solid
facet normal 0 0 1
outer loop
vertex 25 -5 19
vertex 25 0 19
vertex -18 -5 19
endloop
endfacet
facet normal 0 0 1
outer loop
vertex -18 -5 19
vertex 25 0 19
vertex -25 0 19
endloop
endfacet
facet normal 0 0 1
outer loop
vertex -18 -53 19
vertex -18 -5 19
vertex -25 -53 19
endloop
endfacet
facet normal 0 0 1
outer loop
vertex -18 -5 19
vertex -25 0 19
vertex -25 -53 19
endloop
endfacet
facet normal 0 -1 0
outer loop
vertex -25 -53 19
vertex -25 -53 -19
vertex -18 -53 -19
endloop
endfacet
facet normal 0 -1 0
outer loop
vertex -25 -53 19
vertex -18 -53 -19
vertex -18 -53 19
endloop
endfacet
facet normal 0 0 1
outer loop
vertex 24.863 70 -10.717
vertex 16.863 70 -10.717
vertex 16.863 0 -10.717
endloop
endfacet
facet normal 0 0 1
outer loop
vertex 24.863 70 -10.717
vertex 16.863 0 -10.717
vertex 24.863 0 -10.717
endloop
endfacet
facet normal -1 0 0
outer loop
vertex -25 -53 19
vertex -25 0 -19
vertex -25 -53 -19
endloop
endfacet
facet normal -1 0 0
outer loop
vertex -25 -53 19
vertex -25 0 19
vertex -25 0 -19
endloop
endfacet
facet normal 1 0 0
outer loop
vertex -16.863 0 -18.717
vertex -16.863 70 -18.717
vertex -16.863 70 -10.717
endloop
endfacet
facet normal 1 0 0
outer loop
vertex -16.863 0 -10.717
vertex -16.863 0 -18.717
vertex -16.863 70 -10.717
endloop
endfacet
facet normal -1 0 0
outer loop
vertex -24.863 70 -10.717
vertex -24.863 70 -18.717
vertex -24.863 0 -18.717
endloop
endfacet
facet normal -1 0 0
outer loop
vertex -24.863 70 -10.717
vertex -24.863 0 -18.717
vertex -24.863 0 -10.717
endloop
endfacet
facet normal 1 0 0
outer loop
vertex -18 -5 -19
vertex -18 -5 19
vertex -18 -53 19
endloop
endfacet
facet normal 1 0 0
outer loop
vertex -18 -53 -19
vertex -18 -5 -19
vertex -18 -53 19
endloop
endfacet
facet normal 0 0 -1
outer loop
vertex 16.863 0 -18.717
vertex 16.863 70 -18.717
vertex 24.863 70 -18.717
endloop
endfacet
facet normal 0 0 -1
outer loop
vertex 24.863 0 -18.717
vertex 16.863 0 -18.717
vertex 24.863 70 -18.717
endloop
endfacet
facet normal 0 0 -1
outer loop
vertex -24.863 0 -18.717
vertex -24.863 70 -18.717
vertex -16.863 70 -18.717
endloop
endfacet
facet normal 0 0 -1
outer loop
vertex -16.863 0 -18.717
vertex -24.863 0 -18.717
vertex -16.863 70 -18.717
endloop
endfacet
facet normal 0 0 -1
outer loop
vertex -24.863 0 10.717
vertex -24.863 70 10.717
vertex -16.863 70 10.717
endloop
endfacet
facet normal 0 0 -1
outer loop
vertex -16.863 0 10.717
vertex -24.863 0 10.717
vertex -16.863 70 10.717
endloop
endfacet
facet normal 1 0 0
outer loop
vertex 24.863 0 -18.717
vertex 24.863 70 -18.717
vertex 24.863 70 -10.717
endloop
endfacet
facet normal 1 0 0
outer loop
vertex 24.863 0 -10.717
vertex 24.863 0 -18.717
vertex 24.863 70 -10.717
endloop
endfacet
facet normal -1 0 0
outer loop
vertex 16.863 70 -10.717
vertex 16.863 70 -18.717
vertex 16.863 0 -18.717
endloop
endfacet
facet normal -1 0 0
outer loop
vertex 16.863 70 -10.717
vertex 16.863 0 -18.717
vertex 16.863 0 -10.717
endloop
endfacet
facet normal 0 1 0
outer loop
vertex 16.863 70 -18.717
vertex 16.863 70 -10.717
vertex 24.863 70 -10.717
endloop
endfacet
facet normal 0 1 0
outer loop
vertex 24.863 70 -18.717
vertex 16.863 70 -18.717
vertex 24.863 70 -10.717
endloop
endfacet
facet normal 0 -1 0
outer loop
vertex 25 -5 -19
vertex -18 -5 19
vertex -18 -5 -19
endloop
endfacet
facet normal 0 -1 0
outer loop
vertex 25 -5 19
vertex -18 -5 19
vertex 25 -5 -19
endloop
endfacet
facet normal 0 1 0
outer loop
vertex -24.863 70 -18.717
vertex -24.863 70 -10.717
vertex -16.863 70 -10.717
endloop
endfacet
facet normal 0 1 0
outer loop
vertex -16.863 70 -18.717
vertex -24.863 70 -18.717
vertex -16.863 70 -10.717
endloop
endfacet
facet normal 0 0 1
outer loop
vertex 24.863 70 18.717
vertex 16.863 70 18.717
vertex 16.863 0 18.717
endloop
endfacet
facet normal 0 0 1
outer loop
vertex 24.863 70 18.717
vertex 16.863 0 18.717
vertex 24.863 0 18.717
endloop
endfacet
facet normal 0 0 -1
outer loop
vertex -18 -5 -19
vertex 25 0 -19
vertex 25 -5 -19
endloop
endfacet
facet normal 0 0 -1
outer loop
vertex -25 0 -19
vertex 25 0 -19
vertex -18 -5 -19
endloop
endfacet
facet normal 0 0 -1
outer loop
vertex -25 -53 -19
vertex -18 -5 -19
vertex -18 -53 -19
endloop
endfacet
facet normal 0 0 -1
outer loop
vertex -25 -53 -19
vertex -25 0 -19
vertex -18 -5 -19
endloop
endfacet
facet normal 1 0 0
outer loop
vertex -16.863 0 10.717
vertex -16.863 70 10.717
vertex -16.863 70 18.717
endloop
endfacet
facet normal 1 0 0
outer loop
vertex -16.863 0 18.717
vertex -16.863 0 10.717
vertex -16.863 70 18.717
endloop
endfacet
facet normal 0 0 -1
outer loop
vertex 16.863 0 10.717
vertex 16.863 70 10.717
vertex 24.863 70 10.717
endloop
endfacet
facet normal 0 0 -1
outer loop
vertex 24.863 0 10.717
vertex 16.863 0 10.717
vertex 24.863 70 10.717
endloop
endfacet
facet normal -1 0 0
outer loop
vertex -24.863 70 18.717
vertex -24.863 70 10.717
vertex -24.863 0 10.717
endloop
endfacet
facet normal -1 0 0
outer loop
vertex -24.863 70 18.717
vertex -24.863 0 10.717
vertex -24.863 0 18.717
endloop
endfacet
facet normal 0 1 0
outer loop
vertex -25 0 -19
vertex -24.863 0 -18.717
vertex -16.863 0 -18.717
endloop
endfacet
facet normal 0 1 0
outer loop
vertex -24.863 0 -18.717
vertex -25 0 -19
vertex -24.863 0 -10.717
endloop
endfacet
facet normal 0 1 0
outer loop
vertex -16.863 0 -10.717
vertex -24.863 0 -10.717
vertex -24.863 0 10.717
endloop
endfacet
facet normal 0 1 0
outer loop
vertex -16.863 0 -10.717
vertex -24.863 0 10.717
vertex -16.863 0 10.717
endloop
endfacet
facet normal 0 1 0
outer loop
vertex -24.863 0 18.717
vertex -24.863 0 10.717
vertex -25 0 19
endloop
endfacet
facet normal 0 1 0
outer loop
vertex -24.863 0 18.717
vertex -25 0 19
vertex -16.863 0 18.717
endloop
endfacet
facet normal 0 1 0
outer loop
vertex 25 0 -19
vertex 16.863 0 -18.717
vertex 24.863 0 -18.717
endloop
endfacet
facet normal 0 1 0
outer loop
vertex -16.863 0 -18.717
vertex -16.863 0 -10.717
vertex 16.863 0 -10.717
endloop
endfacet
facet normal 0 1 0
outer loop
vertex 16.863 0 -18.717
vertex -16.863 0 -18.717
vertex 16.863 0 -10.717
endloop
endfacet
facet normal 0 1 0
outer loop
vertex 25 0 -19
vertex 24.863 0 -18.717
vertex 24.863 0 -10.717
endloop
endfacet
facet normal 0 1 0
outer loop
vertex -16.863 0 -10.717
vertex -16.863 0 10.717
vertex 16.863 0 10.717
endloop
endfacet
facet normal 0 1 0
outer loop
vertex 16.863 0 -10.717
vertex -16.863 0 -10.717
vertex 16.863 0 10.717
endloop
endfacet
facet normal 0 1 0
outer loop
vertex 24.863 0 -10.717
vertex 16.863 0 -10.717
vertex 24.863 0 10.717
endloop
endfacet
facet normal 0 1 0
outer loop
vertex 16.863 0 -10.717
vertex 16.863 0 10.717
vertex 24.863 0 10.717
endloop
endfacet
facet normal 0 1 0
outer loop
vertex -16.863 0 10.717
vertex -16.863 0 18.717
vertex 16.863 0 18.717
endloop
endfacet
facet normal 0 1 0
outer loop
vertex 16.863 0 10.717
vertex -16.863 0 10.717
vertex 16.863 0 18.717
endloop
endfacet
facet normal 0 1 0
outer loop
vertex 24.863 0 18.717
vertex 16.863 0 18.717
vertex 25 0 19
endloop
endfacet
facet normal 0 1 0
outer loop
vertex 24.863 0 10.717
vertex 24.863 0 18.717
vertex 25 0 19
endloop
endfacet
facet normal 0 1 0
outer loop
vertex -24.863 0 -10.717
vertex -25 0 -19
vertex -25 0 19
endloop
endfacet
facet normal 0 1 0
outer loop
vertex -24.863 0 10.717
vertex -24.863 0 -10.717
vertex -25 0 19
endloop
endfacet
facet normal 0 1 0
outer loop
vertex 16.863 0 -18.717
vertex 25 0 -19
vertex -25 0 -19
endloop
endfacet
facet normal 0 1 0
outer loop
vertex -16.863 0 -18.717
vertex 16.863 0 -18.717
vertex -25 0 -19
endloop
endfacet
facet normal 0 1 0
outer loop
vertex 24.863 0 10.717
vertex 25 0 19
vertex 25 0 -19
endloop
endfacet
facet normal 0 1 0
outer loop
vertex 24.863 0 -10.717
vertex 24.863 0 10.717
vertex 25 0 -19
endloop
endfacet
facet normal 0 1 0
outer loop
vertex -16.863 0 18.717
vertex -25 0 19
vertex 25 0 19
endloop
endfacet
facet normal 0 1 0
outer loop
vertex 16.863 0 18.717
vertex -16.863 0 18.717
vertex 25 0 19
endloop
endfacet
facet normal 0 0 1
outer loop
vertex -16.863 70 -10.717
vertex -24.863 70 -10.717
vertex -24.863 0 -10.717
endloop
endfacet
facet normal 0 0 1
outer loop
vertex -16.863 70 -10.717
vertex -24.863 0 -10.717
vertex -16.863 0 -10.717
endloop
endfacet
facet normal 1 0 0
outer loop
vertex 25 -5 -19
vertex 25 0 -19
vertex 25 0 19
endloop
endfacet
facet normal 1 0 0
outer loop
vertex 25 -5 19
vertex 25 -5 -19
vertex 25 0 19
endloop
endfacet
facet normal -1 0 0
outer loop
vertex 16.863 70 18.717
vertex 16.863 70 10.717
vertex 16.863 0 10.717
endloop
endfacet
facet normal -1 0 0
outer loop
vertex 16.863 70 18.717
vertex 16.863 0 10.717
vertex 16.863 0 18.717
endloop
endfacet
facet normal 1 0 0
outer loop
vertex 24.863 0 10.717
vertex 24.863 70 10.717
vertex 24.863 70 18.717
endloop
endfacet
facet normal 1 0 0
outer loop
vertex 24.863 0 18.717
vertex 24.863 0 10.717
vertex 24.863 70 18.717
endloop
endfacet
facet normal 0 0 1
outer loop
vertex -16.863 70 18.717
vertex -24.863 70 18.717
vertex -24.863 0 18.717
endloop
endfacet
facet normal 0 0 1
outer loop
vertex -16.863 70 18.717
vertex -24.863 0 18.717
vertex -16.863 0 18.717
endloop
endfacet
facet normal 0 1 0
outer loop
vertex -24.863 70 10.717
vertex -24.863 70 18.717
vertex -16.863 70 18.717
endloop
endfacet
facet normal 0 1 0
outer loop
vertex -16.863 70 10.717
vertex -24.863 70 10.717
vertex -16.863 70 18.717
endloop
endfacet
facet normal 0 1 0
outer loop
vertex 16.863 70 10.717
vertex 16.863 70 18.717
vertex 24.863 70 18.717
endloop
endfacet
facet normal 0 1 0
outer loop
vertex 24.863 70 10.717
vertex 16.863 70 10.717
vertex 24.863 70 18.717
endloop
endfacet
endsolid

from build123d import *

# Parameters (mm, degrees)
F0_W     = 50
F0_H     = 38
F1_DEPTH = 5
F2_W     = 8
F2_H     = 8
F3_DEPTH = 70
F4_W     = 48
F4_H     = 38
F5_DEPTH = 7


with BuildPart() as f1:
    # F0 (on Front) → F1 (new body)
    with BuildSketch(Plane.XZ):
        Rectangle(F0_W, F0_H)
    extrude(amount=F1_DEPTH)

    # F2 (on Front) → F3 (join)
    with BuildSketch(Plane.XZ):
        with Locations((20.863473, 14.717139)):
            Rectangle(F2_W, F2_H)
        with Locations((20.863473, -14.717139)):
            Rectangle(F2_W, F2_H)
        with Locations((-20.863473, -14.717139)):
            Rectangle(F2_W, F2_H)
        with Locations((-20.863473, 14.717139)):
            Rectangle(F2_W, F2_H)
    extrude(amount=-F3_DEPTH)

    # F4 (on face) → F5 (join)
    with BuildSketch(Plane(origin=(-25, 0, 0), x_dir=(0, -1, 0), z_dir=(-1, 0, 0))):
        with Locations((29, 0)):
            Rectangle(F4_W, F4_H)
    extrude(amount=-F5_DEPTH)


solid = f1.part
